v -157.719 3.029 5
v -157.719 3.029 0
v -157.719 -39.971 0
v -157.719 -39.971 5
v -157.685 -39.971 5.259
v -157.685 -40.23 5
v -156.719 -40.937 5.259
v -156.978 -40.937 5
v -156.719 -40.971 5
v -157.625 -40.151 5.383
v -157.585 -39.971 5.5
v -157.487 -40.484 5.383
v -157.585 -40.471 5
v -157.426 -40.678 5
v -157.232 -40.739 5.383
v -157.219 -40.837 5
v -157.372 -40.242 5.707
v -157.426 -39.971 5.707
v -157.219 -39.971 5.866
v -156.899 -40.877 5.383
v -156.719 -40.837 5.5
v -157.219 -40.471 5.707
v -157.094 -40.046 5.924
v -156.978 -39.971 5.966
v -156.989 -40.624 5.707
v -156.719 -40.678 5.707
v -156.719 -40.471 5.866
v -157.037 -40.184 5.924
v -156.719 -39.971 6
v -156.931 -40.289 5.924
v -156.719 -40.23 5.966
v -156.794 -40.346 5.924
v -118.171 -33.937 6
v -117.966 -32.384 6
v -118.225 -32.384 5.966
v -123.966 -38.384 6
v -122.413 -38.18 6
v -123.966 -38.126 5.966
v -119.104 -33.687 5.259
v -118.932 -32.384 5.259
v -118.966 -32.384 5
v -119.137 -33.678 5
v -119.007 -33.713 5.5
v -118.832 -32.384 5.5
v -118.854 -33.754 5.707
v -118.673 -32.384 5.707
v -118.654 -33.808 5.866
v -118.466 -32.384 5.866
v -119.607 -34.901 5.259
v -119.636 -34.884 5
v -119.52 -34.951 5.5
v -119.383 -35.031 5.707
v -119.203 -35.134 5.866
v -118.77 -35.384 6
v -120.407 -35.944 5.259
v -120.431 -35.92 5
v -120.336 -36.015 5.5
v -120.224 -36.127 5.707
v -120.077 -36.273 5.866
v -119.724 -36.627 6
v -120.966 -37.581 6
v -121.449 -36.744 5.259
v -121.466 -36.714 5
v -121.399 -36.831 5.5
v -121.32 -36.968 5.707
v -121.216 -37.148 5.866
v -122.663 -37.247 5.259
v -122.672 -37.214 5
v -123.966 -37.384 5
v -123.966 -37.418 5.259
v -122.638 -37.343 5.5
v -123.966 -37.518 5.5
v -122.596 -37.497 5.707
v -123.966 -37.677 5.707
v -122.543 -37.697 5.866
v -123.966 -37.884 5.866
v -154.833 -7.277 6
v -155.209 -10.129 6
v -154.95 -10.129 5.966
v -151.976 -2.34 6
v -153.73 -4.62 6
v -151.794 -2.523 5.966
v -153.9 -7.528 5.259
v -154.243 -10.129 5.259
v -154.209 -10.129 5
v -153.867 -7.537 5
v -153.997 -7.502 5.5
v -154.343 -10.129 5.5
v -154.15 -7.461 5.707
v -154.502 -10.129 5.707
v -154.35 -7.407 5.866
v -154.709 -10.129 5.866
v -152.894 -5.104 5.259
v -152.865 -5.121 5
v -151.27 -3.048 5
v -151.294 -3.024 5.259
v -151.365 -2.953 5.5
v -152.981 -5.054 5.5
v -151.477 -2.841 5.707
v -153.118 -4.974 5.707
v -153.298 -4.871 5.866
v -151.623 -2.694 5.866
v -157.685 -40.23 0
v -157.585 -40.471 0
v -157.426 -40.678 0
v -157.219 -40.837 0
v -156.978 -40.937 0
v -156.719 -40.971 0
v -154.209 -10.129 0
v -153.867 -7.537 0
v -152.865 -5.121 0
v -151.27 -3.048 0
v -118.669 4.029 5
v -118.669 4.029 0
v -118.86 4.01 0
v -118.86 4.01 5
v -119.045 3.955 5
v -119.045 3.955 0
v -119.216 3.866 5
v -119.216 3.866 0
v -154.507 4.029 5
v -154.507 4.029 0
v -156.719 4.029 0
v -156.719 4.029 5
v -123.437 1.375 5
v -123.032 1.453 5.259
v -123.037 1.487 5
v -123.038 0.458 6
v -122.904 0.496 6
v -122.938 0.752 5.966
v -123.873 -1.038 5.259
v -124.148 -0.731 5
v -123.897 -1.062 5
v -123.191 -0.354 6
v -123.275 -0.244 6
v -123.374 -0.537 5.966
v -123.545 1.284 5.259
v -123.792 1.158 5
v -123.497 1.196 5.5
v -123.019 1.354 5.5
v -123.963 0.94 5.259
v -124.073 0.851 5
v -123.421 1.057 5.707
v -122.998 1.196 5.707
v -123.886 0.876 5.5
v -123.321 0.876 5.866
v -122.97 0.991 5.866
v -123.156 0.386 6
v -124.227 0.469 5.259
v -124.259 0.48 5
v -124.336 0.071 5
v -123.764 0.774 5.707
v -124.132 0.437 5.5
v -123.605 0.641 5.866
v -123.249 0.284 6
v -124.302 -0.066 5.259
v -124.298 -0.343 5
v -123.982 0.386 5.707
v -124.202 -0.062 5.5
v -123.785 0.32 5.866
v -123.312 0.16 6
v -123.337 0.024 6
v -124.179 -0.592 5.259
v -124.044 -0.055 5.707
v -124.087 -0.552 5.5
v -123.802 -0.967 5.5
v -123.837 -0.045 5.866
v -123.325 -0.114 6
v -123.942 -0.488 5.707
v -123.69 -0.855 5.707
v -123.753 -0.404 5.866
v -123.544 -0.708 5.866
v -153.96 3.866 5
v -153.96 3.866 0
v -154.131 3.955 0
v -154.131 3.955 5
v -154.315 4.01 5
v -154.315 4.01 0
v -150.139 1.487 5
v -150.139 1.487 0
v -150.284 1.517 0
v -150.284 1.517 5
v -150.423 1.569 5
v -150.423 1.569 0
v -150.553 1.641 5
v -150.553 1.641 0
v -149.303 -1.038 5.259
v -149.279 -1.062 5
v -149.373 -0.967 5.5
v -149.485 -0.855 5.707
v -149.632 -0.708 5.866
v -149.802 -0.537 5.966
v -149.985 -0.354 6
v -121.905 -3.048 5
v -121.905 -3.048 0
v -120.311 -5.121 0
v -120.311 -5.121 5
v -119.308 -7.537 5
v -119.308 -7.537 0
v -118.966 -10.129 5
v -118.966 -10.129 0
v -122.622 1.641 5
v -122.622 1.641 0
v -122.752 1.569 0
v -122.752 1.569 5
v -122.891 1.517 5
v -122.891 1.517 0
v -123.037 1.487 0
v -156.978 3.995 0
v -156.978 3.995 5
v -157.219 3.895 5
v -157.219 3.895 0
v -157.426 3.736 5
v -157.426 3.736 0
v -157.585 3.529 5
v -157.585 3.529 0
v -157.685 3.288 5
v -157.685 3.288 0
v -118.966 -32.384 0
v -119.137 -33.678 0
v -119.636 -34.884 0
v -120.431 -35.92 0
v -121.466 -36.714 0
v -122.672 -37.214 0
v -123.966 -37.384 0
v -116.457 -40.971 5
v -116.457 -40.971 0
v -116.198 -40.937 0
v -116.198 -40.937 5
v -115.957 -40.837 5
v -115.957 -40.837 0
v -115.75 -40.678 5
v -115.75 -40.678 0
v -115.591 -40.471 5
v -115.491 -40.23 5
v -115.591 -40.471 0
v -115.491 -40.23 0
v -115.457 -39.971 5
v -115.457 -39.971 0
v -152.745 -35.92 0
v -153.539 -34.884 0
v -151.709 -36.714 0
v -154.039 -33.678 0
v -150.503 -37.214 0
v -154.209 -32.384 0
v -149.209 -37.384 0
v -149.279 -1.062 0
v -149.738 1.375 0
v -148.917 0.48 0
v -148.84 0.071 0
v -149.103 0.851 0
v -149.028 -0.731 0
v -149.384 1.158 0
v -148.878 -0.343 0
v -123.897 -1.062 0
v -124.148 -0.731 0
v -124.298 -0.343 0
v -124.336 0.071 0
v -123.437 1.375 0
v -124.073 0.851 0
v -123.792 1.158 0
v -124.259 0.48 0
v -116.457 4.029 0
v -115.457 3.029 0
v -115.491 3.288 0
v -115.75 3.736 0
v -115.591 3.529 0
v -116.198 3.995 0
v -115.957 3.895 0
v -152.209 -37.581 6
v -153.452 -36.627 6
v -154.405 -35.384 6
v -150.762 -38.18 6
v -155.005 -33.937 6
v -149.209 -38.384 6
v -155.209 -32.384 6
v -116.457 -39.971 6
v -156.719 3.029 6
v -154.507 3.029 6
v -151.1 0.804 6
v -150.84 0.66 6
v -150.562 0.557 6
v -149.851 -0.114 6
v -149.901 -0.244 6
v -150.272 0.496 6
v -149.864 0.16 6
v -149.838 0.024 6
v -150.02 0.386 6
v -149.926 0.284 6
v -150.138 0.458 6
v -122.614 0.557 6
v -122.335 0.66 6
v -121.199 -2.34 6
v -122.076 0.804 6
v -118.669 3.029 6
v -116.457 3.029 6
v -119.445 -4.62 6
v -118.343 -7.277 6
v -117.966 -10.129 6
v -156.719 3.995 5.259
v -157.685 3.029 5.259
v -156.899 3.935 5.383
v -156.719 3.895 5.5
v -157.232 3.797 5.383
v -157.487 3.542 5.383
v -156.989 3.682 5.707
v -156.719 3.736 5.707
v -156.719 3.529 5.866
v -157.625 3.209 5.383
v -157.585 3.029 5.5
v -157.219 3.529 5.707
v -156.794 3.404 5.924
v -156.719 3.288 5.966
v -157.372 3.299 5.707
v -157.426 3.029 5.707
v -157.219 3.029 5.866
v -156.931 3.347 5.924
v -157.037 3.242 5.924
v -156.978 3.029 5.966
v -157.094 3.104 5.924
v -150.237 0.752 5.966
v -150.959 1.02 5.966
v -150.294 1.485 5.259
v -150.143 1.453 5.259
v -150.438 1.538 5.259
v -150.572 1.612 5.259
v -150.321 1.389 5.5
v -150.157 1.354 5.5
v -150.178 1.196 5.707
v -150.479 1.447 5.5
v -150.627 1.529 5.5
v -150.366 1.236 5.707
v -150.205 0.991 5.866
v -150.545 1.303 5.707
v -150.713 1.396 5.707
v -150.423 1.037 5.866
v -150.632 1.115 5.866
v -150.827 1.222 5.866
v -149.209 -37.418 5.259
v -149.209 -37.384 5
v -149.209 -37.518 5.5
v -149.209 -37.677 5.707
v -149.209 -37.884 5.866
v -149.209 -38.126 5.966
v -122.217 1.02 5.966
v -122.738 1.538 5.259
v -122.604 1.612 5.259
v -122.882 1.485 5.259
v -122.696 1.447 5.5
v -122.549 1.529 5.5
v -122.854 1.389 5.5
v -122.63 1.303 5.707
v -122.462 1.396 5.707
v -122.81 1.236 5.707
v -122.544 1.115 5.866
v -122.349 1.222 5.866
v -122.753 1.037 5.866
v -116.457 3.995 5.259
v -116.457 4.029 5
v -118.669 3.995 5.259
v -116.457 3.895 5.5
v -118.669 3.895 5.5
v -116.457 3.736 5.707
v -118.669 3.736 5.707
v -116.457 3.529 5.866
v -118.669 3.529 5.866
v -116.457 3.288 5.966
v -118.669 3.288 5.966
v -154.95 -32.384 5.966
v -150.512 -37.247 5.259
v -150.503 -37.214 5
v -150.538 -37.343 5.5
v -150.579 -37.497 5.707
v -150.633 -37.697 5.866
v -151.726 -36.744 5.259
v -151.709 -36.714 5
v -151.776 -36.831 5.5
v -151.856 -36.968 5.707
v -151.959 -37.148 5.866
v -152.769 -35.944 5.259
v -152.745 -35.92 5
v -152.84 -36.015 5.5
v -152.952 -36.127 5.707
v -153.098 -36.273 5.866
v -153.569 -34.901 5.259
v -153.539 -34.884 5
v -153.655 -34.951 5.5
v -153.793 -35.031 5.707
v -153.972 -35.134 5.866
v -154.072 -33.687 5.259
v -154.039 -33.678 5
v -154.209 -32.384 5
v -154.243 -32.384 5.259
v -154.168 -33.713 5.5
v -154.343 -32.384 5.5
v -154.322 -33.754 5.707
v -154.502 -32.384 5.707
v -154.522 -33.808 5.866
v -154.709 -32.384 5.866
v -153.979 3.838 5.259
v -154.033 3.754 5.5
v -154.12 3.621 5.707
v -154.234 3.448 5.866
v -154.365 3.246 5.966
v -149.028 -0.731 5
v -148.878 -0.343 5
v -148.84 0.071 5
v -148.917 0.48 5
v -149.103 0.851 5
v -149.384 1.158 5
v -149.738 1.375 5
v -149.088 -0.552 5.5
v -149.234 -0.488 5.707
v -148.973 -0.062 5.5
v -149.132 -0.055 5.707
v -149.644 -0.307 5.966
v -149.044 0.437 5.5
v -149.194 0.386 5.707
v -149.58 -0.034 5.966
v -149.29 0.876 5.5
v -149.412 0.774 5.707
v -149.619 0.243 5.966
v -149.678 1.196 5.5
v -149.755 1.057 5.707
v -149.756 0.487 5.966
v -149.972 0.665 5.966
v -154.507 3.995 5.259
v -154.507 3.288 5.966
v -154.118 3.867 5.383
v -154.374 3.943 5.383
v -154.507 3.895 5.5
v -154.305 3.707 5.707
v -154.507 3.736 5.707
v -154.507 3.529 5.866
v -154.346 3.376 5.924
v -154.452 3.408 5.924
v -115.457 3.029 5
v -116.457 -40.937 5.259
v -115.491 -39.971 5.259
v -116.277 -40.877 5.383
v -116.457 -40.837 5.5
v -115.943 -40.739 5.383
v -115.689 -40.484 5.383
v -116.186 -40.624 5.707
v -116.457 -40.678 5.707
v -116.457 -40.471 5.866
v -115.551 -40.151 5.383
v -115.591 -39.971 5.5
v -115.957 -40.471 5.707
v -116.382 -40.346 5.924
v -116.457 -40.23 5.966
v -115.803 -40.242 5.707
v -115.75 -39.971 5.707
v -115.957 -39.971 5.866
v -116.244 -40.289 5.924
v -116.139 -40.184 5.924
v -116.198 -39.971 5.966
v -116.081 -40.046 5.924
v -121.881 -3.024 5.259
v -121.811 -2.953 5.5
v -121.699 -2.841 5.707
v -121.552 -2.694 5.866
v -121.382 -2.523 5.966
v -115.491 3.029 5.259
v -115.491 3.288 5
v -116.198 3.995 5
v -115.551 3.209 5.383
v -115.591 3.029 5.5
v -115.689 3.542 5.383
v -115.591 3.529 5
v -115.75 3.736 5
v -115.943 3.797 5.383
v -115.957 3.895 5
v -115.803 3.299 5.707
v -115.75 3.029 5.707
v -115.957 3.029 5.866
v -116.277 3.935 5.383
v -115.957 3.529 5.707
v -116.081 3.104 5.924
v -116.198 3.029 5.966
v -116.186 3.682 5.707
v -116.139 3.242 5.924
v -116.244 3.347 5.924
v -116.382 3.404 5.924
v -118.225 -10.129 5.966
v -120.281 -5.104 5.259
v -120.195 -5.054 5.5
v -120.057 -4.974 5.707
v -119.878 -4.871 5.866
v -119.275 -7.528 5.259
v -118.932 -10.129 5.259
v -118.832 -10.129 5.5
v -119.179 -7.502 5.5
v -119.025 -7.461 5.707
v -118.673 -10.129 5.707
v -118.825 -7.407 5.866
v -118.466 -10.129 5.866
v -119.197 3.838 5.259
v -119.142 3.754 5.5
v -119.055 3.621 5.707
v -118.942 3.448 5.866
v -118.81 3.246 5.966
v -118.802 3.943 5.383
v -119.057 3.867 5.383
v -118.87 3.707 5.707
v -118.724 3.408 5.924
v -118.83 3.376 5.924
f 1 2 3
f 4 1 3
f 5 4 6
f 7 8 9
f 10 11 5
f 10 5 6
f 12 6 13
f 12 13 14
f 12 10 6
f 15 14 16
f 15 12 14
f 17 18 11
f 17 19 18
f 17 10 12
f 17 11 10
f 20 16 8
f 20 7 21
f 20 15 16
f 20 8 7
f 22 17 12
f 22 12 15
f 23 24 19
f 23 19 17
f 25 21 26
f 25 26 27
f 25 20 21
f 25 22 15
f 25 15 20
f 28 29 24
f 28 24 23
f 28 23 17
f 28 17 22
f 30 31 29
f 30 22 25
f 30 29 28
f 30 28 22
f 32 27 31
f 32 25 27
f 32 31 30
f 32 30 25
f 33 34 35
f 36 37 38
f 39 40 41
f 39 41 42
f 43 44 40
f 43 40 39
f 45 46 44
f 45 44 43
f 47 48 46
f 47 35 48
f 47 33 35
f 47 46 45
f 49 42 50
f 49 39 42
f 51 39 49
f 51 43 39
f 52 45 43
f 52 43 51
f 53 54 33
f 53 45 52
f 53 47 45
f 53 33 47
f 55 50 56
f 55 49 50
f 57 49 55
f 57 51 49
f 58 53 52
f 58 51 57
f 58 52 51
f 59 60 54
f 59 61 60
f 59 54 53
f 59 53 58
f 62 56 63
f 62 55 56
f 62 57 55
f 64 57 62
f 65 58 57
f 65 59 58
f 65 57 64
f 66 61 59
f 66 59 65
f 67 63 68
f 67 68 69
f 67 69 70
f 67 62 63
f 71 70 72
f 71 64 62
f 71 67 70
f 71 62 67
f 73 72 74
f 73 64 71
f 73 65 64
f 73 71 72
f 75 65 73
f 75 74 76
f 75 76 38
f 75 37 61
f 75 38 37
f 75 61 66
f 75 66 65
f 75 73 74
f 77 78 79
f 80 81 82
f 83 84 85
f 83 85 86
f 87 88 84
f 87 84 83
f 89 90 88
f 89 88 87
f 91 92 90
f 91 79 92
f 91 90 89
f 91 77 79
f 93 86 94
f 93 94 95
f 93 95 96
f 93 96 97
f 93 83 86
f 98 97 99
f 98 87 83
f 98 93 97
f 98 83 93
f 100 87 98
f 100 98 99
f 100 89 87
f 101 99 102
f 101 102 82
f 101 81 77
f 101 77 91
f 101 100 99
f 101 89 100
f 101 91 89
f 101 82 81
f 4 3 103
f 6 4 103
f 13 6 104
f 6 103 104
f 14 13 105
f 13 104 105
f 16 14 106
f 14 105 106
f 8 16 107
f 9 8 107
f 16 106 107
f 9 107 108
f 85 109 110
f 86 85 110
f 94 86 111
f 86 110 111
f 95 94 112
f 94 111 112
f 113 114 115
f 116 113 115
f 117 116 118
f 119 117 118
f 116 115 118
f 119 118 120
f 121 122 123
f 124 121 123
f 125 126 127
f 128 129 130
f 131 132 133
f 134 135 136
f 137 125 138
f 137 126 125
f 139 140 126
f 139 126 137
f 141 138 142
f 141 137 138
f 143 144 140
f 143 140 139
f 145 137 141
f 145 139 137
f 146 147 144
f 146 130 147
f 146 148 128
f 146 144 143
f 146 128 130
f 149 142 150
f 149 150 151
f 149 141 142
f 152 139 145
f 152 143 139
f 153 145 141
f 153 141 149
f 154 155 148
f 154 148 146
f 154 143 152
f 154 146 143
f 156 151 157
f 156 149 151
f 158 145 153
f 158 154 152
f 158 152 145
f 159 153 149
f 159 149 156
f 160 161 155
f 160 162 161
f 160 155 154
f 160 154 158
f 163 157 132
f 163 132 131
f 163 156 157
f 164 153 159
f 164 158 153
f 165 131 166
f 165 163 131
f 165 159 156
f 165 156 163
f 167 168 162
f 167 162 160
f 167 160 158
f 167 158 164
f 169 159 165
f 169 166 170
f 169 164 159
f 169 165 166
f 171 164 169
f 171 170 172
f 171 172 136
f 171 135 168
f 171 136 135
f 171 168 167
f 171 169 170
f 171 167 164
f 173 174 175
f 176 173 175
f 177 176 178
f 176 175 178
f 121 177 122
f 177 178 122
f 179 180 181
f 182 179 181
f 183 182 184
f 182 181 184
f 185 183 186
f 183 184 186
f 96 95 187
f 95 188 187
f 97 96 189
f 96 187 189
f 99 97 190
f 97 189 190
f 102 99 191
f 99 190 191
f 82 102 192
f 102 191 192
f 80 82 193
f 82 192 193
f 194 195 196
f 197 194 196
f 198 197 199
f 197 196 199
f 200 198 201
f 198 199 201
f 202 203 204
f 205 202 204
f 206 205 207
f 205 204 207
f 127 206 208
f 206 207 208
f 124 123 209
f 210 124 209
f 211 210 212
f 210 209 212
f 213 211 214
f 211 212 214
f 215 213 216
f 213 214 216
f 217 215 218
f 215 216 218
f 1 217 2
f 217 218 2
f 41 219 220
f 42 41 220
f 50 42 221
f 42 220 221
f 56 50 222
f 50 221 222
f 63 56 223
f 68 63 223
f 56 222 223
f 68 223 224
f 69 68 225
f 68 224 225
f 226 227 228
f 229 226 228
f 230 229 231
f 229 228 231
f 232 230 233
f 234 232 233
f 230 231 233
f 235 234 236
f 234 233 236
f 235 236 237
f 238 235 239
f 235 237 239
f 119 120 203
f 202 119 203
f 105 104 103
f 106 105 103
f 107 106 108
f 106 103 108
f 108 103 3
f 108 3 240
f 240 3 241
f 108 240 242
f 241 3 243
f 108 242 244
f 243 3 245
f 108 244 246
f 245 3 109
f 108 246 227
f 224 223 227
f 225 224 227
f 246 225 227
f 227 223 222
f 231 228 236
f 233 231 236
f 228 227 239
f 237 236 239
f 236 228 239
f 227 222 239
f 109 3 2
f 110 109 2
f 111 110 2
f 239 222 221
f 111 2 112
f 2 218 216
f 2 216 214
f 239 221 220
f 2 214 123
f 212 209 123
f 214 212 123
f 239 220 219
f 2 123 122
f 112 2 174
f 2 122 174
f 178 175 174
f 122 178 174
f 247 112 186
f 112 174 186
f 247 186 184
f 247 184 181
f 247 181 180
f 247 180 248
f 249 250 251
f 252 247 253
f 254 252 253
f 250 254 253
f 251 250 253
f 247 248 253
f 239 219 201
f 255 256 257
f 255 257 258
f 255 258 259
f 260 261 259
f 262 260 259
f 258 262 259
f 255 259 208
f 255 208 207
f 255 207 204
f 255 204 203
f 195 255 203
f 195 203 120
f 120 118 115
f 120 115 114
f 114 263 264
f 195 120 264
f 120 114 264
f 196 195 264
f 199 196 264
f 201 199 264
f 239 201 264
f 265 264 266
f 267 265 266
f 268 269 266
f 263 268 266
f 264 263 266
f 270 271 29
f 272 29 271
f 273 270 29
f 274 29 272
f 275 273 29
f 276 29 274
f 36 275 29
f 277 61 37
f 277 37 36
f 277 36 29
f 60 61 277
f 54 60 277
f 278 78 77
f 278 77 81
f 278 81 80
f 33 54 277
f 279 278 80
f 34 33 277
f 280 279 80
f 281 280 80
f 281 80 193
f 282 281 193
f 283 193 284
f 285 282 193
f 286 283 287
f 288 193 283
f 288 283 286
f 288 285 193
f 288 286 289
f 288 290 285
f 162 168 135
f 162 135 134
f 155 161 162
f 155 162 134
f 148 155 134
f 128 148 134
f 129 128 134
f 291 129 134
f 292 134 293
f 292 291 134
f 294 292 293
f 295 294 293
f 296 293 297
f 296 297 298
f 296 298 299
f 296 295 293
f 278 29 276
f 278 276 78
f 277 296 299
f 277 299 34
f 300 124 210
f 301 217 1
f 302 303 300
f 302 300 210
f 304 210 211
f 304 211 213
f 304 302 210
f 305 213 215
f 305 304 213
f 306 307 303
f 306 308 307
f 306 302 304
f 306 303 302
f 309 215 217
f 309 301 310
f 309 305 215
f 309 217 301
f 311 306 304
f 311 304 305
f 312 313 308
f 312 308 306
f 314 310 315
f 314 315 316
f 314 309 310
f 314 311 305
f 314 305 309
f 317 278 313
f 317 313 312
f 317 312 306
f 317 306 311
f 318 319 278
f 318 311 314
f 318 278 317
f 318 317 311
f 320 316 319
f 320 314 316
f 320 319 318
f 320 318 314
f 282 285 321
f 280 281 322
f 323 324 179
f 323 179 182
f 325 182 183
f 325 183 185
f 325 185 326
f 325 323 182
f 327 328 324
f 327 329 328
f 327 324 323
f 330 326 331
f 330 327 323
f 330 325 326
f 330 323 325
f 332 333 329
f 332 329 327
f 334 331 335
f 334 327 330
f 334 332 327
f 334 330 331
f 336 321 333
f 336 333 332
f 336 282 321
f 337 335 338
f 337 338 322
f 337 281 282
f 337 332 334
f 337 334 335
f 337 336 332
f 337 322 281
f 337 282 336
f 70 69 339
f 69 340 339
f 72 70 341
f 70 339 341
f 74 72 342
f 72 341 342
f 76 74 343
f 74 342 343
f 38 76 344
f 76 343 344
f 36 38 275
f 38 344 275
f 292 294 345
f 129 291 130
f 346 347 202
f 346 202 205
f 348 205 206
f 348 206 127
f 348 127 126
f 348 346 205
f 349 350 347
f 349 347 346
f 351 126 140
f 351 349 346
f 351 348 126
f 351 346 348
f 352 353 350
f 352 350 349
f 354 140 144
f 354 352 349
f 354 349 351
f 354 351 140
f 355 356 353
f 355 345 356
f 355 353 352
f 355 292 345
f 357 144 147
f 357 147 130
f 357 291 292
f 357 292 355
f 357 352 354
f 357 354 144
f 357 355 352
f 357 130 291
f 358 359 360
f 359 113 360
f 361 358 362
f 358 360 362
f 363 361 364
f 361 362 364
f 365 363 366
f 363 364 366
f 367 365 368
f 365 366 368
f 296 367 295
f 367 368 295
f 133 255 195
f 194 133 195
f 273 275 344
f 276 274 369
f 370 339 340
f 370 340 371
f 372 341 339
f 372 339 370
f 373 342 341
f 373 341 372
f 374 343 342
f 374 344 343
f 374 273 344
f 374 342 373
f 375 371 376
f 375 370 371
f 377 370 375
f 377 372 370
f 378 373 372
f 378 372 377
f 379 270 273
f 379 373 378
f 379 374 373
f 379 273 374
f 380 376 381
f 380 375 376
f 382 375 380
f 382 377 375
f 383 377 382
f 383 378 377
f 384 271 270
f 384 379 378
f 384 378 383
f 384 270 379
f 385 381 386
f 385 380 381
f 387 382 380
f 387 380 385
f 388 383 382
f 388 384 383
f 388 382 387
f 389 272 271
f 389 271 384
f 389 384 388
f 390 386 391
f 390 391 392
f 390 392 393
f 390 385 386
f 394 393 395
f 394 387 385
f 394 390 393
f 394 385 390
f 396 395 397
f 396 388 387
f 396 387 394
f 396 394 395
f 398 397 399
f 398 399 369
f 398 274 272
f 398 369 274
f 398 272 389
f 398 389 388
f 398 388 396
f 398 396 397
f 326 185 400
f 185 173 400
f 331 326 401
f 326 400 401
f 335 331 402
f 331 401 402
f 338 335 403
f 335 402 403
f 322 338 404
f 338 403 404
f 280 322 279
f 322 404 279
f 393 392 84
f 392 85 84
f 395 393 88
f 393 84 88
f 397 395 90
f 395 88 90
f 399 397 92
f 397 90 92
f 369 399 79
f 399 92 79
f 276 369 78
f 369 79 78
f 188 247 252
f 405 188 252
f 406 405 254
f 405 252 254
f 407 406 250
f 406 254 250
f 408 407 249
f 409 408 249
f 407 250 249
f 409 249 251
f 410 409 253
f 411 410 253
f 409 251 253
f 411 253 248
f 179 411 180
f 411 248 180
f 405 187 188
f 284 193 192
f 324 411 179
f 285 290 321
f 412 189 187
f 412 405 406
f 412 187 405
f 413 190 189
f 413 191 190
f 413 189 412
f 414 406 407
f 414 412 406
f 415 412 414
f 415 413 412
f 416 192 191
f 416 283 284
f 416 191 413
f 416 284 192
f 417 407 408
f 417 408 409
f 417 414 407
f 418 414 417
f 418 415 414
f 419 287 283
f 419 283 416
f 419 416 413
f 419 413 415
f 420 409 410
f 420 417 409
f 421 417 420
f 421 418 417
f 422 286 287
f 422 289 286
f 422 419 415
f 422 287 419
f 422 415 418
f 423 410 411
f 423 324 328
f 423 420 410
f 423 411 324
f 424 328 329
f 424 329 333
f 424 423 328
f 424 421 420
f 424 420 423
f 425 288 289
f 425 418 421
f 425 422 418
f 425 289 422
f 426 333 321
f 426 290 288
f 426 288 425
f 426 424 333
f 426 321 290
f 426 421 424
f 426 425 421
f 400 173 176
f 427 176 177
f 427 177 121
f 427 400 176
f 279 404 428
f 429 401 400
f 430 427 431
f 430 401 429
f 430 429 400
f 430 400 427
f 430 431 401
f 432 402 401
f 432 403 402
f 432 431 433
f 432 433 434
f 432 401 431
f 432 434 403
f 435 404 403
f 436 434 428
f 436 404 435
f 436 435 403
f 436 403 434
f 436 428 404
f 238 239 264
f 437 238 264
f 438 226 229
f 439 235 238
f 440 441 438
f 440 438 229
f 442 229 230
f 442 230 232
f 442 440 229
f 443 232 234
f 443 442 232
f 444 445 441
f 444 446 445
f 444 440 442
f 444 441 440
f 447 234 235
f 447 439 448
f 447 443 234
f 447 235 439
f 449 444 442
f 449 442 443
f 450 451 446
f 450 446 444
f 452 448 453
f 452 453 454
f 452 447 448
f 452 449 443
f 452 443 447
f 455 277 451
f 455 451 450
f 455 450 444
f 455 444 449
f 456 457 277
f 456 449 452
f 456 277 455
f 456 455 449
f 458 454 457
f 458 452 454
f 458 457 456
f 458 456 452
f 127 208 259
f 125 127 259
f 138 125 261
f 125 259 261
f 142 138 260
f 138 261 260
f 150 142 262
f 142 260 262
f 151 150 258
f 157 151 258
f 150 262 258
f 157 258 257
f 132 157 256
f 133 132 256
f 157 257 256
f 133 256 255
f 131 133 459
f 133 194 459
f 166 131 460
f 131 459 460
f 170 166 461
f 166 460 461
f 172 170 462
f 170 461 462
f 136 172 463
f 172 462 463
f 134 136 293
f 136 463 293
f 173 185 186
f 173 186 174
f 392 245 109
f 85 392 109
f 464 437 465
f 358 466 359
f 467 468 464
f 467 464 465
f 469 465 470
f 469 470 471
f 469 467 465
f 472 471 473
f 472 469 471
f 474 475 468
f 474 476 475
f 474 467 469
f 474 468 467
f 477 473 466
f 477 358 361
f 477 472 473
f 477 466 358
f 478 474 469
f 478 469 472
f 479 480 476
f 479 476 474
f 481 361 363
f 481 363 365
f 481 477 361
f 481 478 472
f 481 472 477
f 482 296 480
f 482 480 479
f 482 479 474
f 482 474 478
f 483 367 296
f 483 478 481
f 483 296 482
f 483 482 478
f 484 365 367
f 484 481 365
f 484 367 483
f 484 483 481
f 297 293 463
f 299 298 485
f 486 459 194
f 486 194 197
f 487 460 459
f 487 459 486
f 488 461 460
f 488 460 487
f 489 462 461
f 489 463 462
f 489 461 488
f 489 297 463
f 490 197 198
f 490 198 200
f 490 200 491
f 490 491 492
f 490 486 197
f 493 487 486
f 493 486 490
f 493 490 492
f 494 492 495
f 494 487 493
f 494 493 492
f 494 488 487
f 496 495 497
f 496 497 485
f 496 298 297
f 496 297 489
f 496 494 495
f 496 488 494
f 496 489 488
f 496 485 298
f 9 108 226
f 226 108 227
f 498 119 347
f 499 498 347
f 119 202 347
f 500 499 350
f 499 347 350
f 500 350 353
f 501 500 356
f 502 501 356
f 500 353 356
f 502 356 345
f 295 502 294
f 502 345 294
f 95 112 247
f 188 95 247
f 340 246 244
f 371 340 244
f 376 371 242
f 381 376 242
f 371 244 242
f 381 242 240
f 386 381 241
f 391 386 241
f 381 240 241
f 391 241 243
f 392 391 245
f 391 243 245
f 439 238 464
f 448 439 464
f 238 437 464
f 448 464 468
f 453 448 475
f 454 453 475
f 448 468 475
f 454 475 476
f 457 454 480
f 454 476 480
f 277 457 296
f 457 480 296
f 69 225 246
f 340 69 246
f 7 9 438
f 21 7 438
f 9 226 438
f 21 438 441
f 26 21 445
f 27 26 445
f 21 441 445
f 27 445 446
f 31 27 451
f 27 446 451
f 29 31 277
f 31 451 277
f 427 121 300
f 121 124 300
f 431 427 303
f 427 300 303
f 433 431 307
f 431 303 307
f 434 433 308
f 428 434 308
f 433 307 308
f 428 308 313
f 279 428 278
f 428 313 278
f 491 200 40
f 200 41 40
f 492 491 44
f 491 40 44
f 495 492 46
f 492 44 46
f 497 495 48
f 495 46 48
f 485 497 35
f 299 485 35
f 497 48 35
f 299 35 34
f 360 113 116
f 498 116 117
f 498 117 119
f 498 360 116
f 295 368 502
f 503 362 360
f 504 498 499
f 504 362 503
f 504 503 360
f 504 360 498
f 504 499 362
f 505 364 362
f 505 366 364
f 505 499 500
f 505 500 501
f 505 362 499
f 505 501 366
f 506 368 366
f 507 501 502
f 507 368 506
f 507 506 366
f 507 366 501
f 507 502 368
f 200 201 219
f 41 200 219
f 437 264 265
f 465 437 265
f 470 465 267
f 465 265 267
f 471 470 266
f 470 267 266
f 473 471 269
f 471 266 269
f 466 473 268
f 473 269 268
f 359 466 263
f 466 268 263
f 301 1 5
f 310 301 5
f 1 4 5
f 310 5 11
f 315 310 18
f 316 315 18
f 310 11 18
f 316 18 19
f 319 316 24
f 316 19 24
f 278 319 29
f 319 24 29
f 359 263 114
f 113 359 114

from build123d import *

# Parameters (mm, degrees)
BOSS_EXTRUDE1_DEPTH = 6
FILLET2_R           = 1


with BuildPart() as part:
    # Sketch1 → Boss-Extrude1 (new body)
    with BuildSketch(Plane.XY):
        with BuildLine():
            ThreePointArc((-157.718887647, -39.971100876), (-157.425994428, -40.678207657), (-156.718887647, -40.971100876))
            Line((-156.718887647, -40.971100876), (-154.209280647, -40.971100876))
            Line((-154.209280647, -40.971100876), (-118.966369371, -40.971100876))
            Line((-118.966369371, -40.971100876), (-116.875365395, -40.971100876))
            Line((-116.875365395, -40.971100876), (-116.456762371, -40.971100876))
            ThreePointArc((-116.456762371, -40.971100876), (-115.749655589, -40.678207657), (-115.456762371, -39.971100876))
            Line((-115.456762371, -39.971100876), (-115.456762371, 3.028899124))
            ThreePointArc((-115.456762371, 3.028899124), (-115.749655589, 3.736005905), (-116.456762371, 4.028899124))
            Line((-116.456762371, 4.028899124), (-118.668700725, 4.028899124))
            ThreePointArc((-118.668700725, 4.028899124), (-118.953997988, 3.987338205), (-119.215580818, 3.866110067))
            Line((-119.215580818, 3.866110067), (-122.622400092, 1.640719134))
            ThreePointArc((-122.622400092, 1.640719134), (-122.820936659, 1.540563133), (-123.036698115, 1.486758046))
            ThreePointArc((-123.036698115, 1.486758046), (-124.259059599, 0.479679308), (-123.896981272, -1.062161951))
            Line((-123.896981272, -1.062161951), (-121.905327613, -3.048179664))
            ThreePointArc((-121.905327613, -3.048179664), (-119.730287475, -6.295880771), (-118.966369371, -10.129259334))
            Line((-118.966369371, -10.129259334), (-118.966369371, -32.384364229))
            ThreePointArc((-118.966369371, -32.384364229), (-120.430835465, -35.919898135), (-123.966369371, -37.384364229))
            Line((-123.966369371, -37.384364229), (-149.209280647, -37.384364229))
            ThreePointArc((-149.209280647, -37.384364229), (-152.744814552, -35.919898135), (-154.209280647, -32.384364229))
            Line((-154.209280647, -32.384364229), (-154.209280647, -10.129259334))
            ThreePointArc((-154.209280647, -10.129259334), (-153.445362542, -6.295880771), (-151.270322404, -3.048179664))
            Line((-151.270322404, -3.048179664), (-149.278668745, -1.062161951))
            ThreePointArc((-149.278668745, -1.062161951), (-148.916590418, 0.479679308), (-150.138951903, 1.486758046))
            ThreePointArc((-150.138951903, 1.486758046), (-150.354713358, 1.540563133), (-150.553249925, 1.640719134))
            Line((-150.553249925, 1.640719134), (-153.960069199, 3.866110067))
            ThreePointArc((-153.960069199, 3.866110067), (-154.221652029, 3.987338205), (-154.506949292, 4.028899124))
            Line((-154.506949292, 4.028899124), (-156.718887647, 4.028899124))
            ThreePointArc((-156.718887647, 4.028899124), (-157.425994428, 3.736005905), (-157.718887647, 3.028899124))
            Line((-157.718887647, 3.028899124), (-157.718887647, -39.971100876))
        make_face()
    extrude(amount=BOSS_EXTRUDE1_DEPTH)

    # Fillet2
    fillet2_edges = [part.edges().sort_by_distance(p)[0] for p in [
        (-122.820936659, 1.540563133, 6),
        (-124.259059599, 0.479679308, 6),
        (-154.209280647, -21.256811782, 6),
        (-122.901154442, -2.055170807, 6),
        (-119.730287475, -6.295880771, 6),
        (-118.966369371, -21.256811782, 6),
        (-120.430835465, -35.919898135, 6),
        (-136.587825009, -37.384364229, 6),
        (-153.445362542, -6.295880771, 6),
        (-150.274495575, -2.055170807, 6),
        (-148.916590418, 0.479679308, 6),
        (-150.354713358, 1.540563133, 6),
        (-152.256659562, 2.7534146, 6),
        (-154.221652029, 3.987338205, 6),
        (-155.612918469, 4.028899124, 6),
        (-157.425994428, 3.736005905, 6),
        (-157.718887647, -18.471100876, 6),
        (-152.744814552, -35.919898135, 6),
        (-157.425994428, -40.678207657, 6),
        (-136.587825009, -40.971100876, 6),
        (-115.749655589, -40.678207657, 6),
        (-115.456762371, -18.471100876, 6),
        (-115.749655589, 3.736005905, 6),
        (-117.562731548, 4.028899124, 6),
        (-118.953997988, 3.987338205, 6),
        (-120.918990455, 2.7534146, 6),
    ]]
    fillet(fillet2_edges, radius=FILLET2_R)


solid = part.part
